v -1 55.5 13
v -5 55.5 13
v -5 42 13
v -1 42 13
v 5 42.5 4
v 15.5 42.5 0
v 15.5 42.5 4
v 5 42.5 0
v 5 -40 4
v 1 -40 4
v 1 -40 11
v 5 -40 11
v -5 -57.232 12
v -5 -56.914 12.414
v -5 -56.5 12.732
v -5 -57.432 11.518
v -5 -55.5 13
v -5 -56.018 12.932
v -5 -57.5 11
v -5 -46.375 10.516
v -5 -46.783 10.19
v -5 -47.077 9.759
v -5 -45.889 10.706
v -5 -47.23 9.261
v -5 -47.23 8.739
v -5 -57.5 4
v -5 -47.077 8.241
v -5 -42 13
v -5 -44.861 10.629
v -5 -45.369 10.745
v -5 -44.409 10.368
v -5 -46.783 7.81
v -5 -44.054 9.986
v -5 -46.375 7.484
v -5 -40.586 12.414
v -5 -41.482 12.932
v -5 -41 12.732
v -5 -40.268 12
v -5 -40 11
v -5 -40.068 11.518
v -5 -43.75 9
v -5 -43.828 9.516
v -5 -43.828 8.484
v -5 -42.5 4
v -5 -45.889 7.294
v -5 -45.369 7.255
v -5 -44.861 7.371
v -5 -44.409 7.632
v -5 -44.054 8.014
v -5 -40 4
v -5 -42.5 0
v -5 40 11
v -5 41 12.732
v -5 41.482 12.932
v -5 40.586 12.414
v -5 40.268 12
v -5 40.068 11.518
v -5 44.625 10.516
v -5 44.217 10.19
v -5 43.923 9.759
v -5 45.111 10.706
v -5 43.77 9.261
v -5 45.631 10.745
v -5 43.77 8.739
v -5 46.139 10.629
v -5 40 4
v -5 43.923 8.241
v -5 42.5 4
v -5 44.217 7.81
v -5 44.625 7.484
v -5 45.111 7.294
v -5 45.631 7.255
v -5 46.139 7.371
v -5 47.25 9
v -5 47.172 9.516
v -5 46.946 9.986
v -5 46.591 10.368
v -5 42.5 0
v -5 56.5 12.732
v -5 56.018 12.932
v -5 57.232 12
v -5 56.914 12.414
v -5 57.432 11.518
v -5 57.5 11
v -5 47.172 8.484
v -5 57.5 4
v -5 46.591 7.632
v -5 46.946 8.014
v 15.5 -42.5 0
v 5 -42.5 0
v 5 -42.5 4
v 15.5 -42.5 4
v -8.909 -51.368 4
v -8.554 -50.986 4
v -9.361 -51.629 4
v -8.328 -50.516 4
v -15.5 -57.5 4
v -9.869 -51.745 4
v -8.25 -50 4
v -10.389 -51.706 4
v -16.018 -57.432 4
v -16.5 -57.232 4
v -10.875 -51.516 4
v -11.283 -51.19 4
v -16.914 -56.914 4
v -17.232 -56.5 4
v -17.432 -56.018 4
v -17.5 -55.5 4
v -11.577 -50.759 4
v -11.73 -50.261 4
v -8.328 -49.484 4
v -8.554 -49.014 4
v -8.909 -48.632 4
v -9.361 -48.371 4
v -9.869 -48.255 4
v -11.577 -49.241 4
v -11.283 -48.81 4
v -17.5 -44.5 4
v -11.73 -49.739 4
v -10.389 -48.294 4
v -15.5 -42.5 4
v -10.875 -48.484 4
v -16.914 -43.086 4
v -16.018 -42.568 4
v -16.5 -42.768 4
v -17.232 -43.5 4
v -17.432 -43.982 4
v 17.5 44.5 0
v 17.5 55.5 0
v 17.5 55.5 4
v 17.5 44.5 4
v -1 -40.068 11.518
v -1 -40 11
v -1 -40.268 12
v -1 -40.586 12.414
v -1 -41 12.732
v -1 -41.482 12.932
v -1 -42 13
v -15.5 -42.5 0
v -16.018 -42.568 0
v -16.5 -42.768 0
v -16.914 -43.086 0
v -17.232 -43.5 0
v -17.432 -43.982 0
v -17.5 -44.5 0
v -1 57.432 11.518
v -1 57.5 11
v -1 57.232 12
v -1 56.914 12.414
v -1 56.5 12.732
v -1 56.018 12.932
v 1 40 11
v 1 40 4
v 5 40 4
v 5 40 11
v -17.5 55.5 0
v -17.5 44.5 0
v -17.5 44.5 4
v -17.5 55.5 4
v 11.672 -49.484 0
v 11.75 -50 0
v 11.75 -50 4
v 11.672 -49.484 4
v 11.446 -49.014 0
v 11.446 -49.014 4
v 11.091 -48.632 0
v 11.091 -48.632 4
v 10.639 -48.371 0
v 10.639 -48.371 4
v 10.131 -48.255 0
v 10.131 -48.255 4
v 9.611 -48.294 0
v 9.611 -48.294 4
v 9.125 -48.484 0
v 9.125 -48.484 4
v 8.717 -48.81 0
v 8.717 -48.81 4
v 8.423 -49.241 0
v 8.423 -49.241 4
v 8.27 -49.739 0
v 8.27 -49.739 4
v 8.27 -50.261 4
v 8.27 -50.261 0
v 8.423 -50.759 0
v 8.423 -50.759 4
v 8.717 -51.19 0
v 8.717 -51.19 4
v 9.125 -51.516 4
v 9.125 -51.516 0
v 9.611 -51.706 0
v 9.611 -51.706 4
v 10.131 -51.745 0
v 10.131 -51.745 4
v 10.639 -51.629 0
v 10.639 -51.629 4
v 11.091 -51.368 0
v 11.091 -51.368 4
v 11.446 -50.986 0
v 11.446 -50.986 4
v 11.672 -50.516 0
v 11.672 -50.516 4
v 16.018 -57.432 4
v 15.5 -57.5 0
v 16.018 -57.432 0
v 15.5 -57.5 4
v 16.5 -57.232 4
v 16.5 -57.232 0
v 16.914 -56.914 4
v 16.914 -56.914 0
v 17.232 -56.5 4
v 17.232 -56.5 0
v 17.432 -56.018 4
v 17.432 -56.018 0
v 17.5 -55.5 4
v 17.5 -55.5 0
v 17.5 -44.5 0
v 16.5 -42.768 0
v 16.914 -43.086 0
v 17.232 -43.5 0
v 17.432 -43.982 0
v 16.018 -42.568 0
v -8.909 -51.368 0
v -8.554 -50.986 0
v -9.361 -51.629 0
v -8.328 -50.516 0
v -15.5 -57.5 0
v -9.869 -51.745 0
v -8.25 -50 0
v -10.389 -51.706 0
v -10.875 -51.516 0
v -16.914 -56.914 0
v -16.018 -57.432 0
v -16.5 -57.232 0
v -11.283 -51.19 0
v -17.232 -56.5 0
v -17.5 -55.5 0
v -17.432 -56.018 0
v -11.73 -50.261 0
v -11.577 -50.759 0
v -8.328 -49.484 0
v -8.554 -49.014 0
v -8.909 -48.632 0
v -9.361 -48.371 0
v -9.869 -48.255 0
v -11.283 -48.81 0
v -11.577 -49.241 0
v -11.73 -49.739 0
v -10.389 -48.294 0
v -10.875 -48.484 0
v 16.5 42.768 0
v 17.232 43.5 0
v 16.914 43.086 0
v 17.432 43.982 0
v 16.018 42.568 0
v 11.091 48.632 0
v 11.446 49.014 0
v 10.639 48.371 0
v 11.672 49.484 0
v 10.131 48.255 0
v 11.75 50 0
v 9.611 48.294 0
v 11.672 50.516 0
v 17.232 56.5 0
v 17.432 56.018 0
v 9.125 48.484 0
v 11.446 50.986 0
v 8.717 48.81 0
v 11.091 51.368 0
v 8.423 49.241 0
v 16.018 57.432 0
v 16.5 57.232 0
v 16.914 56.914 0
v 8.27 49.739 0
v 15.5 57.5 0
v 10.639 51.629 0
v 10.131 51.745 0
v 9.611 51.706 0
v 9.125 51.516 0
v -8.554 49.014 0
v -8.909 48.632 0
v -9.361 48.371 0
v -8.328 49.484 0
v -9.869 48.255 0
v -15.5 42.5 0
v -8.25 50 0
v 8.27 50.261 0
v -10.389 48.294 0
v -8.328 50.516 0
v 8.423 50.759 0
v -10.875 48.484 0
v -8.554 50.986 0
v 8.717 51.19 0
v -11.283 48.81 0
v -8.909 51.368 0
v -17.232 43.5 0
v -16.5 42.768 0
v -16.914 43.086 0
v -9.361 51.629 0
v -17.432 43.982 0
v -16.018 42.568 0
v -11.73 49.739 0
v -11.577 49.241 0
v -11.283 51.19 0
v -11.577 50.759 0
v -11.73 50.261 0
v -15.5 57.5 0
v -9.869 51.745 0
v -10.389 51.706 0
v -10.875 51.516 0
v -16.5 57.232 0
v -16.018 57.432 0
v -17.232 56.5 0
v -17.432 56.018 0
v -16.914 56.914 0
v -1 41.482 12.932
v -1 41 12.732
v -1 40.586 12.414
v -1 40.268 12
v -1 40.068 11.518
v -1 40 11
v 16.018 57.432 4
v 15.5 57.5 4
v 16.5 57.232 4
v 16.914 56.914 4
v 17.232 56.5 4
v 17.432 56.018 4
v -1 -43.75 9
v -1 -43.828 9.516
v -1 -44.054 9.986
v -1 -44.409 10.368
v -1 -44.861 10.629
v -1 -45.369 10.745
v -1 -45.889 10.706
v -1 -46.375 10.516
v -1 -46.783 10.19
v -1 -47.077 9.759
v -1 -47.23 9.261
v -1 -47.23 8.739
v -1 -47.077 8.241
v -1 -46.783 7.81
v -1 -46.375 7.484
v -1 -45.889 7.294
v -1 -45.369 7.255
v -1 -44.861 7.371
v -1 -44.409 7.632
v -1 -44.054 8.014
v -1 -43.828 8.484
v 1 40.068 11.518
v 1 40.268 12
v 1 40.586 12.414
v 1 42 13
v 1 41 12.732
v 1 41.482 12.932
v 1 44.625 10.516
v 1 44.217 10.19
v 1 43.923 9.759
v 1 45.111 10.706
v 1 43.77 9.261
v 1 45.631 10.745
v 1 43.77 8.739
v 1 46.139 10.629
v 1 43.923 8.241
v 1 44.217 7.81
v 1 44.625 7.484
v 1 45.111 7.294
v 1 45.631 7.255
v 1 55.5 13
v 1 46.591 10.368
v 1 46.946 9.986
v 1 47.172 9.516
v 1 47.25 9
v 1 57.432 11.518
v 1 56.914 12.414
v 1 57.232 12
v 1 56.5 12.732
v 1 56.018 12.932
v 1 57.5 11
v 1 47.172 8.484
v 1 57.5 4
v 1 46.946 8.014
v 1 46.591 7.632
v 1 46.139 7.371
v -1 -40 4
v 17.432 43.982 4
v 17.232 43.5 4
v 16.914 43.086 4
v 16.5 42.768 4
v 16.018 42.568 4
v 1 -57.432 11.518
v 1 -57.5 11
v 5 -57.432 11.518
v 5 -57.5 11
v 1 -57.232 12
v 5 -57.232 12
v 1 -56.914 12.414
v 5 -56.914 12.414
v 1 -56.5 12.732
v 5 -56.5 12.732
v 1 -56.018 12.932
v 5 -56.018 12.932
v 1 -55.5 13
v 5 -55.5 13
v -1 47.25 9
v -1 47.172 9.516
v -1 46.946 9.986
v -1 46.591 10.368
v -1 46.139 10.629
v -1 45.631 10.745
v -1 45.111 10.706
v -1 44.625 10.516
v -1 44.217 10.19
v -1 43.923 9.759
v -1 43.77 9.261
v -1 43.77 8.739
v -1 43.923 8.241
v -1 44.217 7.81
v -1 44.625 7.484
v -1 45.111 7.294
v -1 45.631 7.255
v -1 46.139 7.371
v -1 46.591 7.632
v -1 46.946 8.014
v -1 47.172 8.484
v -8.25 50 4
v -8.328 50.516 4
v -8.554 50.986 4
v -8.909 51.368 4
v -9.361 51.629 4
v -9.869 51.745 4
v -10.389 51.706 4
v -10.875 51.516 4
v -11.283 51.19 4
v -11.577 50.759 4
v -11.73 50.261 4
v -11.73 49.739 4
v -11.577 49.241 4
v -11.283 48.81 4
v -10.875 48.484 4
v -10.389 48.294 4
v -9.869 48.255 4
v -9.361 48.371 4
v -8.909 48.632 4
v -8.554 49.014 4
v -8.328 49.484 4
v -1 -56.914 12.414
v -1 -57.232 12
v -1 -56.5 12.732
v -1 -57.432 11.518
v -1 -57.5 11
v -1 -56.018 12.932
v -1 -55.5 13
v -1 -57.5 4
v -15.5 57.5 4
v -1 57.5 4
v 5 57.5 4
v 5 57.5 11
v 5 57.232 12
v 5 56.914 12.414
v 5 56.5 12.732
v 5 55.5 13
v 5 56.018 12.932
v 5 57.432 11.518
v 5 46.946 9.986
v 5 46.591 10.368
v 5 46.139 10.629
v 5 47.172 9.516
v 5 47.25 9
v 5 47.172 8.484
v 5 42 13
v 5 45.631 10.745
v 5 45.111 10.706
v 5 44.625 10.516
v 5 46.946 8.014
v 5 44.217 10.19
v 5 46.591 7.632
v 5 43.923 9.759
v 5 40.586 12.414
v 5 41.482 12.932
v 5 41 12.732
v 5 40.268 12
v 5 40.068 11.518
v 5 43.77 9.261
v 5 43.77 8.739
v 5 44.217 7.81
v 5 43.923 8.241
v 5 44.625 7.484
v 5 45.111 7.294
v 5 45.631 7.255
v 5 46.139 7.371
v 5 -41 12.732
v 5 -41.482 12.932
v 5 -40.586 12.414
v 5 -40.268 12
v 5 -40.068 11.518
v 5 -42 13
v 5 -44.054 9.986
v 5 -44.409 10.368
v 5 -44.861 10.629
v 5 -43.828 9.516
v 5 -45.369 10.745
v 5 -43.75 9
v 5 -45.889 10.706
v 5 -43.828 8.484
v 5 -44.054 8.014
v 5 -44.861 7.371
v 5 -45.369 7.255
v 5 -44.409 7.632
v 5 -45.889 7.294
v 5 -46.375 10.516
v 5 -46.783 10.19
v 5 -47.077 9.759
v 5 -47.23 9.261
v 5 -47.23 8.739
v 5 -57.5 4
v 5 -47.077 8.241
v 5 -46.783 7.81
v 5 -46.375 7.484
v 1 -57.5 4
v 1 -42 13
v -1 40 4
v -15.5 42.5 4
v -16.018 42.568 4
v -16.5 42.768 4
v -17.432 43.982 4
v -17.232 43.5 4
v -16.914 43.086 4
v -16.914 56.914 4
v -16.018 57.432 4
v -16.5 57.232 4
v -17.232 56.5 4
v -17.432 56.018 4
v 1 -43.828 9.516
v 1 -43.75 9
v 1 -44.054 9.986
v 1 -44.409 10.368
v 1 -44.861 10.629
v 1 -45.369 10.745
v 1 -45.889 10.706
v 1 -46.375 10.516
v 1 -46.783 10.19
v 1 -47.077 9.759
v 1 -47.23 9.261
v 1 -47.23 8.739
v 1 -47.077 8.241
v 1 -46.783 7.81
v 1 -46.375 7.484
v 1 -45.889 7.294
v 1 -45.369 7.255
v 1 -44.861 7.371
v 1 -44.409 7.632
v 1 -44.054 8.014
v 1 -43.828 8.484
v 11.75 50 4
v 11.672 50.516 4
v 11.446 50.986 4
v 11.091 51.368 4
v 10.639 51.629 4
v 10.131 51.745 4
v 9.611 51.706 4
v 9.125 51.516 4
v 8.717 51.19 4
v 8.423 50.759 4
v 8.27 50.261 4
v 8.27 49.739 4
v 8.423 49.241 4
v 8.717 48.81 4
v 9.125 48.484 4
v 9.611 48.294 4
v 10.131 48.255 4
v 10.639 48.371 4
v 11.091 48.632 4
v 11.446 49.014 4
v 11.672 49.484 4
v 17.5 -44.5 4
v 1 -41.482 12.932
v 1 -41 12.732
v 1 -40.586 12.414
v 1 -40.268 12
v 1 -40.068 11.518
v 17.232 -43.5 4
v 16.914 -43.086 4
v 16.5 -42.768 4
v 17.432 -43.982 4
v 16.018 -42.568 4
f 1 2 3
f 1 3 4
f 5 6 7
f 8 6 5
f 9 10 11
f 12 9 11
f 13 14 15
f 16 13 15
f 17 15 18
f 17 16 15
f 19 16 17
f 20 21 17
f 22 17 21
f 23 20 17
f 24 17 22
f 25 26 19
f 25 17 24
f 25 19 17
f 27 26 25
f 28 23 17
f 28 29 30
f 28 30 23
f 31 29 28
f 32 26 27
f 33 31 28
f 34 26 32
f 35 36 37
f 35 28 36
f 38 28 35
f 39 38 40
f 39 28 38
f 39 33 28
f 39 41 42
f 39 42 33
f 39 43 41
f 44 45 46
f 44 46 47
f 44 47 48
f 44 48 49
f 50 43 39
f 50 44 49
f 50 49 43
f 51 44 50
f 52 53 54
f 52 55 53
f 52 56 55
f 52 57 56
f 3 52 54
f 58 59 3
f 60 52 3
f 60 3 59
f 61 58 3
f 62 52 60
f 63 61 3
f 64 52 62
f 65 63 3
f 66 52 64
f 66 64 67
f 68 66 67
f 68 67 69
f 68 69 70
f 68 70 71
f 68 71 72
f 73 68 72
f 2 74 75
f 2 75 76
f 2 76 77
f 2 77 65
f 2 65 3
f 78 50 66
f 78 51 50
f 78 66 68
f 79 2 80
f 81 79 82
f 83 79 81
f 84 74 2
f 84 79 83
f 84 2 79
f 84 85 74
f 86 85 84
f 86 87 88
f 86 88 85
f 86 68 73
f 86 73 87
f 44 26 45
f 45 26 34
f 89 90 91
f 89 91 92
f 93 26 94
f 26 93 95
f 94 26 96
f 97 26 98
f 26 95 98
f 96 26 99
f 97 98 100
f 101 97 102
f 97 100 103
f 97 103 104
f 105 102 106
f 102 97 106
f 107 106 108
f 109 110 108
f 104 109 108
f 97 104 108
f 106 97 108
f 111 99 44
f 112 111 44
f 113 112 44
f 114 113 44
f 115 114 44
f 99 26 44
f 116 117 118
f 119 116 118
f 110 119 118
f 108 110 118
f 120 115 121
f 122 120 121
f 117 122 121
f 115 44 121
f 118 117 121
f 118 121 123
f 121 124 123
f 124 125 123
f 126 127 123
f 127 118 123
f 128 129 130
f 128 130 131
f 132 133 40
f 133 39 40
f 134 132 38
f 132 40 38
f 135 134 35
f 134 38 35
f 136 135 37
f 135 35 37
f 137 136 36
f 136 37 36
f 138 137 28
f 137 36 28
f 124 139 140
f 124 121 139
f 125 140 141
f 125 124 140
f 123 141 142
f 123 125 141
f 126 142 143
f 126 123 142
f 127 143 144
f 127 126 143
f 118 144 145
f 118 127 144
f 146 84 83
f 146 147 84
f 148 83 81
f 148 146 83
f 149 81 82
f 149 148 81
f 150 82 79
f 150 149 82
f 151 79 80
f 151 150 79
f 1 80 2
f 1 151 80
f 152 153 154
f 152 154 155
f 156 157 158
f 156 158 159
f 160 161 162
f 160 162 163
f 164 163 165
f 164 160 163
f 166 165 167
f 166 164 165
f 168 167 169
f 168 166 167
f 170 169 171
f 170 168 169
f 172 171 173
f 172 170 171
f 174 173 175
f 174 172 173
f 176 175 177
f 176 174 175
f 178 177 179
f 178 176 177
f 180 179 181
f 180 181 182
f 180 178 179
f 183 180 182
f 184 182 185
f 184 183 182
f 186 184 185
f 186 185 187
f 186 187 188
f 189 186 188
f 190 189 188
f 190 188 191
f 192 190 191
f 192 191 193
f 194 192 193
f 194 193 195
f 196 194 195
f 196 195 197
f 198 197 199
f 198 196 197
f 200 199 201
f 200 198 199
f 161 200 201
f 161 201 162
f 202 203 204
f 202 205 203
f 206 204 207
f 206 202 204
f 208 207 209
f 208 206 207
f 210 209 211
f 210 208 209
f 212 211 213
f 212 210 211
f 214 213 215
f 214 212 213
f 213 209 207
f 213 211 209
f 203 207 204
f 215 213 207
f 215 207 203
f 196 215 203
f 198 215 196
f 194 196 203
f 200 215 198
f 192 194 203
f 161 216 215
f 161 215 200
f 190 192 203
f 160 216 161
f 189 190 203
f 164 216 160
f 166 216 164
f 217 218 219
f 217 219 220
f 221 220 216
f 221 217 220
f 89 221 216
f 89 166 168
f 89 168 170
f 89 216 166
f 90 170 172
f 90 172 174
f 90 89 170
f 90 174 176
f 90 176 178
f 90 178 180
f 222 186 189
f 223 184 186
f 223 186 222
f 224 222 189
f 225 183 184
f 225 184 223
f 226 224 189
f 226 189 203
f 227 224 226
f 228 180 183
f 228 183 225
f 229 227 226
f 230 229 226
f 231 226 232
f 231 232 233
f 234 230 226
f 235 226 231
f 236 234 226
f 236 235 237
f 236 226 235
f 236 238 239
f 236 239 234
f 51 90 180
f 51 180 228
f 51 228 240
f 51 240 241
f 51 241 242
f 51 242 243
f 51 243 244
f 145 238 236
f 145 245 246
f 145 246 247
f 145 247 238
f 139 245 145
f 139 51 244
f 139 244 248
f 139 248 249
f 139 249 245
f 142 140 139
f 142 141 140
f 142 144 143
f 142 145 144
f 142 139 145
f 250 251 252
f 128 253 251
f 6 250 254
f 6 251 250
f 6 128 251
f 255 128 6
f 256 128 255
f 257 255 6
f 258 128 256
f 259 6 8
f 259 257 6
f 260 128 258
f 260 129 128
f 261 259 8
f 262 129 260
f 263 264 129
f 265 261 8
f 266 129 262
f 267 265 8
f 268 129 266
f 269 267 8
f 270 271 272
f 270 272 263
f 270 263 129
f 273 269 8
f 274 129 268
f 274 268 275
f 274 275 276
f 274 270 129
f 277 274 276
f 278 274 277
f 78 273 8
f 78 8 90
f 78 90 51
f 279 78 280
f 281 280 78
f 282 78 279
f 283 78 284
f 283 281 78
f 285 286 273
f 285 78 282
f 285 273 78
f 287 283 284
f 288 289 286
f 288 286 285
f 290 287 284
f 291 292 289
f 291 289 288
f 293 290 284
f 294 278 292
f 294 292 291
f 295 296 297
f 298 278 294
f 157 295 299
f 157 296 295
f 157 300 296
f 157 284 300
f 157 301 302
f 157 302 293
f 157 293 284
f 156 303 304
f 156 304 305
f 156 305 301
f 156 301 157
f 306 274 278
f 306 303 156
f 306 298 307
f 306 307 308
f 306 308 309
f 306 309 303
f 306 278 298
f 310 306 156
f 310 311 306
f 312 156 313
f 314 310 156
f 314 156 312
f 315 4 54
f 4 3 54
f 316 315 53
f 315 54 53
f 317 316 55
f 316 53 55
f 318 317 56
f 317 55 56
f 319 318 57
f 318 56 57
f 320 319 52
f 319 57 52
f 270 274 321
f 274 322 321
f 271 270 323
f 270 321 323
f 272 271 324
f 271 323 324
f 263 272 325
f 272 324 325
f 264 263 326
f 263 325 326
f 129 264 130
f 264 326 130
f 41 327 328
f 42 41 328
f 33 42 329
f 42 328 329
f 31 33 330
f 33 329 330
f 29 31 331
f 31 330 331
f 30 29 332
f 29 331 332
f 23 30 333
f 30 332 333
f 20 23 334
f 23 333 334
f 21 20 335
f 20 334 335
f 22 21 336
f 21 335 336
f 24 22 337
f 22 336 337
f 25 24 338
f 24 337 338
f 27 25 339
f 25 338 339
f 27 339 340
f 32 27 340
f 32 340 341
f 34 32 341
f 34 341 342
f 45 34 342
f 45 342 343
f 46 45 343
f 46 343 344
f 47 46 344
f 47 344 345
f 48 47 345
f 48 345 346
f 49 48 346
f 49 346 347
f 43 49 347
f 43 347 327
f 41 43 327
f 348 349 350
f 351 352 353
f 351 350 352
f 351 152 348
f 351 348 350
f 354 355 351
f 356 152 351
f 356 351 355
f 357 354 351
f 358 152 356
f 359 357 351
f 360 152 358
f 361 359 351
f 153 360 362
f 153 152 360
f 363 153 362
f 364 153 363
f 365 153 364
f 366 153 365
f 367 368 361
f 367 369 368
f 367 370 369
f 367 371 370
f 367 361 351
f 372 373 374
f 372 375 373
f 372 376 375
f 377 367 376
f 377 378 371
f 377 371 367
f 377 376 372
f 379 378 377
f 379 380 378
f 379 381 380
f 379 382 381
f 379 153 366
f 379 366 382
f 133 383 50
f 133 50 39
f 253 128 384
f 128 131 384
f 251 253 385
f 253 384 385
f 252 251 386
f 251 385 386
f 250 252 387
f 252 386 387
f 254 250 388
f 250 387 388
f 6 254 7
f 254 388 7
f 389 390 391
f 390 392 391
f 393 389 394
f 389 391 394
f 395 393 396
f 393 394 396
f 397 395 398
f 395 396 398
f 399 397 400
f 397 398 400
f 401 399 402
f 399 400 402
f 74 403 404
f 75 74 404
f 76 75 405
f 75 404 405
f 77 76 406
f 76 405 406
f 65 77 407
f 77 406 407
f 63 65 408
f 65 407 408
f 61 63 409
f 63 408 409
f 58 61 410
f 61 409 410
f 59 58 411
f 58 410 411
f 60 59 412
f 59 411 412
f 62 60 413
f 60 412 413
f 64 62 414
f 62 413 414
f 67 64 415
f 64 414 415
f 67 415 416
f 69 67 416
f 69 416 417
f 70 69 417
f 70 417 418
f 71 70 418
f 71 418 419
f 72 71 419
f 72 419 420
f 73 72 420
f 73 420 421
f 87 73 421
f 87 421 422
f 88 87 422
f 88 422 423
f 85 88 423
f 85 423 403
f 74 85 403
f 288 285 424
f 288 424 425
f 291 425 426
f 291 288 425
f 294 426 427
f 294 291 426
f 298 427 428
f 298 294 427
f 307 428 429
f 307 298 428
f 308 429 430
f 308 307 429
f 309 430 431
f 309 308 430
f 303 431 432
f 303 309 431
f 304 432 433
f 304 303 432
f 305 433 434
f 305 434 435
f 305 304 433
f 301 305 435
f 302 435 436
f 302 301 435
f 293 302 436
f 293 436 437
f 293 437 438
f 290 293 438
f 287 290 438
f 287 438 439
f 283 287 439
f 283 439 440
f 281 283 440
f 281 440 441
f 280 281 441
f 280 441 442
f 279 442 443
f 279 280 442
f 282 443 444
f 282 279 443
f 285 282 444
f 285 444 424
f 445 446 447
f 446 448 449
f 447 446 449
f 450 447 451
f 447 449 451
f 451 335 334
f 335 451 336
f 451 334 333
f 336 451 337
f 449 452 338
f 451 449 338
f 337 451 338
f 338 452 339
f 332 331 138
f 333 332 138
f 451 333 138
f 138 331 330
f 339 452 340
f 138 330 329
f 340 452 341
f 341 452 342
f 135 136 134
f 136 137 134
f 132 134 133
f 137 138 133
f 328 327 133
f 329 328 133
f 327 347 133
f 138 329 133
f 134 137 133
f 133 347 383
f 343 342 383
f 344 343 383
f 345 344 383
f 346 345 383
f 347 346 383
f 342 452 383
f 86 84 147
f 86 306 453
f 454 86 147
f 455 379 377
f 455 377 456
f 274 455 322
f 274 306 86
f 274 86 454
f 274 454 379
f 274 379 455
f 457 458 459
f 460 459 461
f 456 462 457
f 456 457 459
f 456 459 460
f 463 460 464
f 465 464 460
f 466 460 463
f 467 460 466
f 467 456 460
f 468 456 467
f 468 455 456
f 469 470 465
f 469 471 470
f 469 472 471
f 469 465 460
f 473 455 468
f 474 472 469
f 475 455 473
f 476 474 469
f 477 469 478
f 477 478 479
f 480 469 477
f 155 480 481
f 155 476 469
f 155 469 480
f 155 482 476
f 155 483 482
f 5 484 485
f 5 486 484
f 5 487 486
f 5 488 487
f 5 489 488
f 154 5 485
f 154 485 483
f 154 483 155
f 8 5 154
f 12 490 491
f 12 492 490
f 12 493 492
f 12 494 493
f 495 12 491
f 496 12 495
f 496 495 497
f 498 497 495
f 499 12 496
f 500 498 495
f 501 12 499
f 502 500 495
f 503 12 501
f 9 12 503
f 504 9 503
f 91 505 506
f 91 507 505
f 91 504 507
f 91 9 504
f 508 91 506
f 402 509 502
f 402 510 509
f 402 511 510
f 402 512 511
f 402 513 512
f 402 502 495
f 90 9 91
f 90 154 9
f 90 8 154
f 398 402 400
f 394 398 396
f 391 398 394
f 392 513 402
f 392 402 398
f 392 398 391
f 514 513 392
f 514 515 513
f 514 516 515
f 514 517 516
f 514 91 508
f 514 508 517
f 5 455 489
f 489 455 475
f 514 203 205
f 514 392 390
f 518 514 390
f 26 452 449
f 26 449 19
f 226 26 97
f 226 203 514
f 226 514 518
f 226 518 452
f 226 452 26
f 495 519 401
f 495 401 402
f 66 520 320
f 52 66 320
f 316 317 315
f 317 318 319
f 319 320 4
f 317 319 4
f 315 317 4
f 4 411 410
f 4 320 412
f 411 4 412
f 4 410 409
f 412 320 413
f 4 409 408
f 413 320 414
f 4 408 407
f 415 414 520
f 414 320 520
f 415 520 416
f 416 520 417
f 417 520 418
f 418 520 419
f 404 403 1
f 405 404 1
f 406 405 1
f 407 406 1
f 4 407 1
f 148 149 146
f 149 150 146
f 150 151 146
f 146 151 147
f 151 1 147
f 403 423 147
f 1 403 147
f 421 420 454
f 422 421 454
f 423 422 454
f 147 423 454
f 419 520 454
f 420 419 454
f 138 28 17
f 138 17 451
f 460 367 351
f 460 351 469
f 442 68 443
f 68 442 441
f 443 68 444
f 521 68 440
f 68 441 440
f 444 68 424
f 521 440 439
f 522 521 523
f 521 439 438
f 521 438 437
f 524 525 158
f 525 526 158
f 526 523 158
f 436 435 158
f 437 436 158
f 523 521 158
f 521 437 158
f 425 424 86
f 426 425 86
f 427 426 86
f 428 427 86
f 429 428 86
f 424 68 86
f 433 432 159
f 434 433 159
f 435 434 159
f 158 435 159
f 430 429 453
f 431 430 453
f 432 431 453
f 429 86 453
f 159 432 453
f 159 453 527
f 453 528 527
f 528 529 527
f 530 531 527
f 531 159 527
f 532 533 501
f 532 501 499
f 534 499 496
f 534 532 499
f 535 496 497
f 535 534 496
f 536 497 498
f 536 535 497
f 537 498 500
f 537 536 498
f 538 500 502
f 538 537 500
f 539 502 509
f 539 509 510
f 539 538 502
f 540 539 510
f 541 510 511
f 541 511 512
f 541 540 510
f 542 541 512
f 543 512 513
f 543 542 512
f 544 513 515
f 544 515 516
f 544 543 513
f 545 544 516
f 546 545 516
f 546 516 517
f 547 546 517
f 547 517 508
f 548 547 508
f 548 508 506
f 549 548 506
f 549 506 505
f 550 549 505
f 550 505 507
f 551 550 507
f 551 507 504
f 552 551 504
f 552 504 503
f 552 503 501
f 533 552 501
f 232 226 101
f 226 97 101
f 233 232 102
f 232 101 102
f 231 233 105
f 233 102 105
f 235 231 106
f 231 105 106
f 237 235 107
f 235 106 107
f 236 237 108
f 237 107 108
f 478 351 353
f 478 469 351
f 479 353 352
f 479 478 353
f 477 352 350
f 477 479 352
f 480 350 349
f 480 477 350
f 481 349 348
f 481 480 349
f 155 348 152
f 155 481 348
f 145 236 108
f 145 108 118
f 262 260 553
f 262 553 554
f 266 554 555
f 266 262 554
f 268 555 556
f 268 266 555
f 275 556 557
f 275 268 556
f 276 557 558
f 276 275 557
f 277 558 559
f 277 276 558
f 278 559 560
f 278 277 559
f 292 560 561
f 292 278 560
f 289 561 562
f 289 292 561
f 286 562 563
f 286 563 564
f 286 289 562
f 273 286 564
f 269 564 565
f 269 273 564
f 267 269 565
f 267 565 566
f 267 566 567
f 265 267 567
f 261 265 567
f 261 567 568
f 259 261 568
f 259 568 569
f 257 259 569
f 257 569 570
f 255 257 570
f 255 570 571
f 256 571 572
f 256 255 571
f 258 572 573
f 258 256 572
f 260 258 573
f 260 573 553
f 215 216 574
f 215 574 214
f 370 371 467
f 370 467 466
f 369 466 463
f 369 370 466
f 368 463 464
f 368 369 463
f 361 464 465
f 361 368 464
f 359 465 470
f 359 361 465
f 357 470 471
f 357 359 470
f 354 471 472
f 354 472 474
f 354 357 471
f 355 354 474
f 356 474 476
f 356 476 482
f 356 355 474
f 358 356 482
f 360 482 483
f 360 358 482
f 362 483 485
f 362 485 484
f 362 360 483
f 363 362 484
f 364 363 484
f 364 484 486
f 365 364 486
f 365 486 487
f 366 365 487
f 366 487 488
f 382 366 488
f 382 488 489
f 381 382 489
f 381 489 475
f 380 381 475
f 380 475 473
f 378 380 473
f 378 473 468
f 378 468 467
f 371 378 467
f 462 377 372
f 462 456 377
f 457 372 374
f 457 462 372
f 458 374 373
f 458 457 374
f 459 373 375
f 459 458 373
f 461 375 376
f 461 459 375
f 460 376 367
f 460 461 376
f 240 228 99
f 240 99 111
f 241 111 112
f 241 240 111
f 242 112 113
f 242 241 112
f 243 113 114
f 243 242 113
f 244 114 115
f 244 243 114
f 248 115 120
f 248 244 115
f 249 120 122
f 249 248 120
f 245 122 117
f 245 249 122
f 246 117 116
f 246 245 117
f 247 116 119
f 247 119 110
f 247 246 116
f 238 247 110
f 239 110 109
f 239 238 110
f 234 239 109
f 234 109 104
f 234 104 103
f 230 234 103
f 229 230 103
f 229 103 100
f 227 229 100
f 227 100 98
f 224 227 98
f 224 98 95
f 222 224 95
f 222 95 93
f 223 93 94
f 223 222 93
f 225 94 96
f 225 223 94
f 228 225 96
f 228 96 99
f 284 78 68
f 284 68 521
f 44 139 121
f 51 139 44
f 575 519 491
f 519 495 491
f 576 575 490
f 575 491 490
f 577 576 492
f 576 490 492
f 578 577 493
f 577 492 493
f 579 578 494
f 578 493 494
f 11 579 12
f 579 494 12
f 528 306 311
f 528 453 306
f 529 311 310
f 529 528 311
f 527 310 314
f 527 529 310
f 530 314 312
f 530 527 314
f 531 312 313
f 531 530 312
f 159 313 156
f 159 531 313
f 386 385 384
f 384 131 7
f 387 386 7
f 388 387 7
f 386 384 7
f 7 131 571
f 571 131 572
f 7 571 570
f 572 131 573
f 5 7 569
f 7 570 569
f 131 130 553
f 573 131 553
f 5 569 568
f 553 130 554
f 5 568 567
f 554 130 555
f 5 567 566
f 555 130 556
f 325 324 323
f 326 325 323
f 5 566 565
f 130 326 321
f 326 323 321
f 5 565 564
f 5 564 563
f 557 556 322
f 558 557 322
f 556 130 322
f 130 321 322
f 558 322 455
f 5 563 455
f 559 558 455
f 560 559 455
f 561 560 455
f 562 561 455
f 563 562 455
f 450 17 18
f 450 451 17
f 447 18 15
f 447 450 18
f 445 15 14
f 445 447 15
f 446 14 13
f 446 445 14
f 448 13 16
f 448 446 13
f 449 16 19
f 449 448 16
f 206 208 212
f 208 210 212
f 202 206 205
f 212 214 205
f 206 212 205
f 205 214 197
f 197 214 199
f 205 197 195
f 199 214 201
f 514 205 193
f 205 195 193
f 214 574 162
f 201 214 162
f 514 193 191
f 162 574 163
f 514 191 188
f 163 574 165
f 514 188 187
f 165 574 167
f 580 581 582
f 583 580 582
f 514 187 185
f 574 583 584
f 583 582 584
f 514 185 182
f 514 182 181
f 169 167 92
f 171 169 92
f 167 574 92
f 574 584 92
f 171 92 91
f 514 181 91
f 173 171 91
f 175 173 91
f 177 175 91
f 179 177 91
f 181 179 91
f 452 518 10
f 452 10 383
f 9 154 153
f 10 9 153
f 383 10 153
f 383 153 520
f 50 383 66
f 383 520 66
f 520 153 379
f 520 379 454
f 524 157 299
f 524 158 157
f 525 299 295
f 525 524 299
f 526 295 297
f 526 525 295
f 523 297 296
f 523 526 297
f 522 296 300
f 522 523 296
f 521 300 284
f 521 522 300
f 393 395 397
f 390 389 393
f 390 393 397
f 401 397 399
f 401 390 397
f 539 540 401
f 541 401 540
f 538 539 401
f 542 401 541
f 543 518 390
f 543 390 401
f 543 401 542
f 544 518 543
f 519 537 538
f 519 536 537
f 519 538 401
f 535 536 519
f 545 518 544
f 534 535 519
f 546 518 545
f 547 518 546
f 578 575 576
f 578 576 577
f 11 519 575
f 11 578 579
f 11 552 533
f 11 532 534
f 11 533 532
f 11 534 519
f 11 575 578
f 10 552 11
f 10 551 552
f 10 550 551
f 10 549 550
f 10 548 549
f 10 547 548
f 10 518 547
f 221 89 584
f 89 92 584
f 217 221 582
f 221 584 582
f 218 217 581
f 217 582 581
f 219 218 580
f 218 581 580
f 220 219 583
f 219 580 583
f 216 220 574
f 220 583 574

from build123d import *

# Parameters (mm, degrees)
SKETCH_R          = 1.75
PAD_DEPTH         = 4
SKETCH001_W       = 4
SKETCH001_H       = 115
PAD001_DEPTH      = 13
SKETCH002_R       = 1.75
SKETCH002_W       = 80
SKETCH002_H       = 9
POCKET_DEPTH      = 10
POCKET_DEPTH_BACK = -5
FILLET_R          = 2


with BuildPart() as part:
    # Sketch → Pad (new body)
    with BuildSketch(Plane.XY):
        Polygon((-17.5, 57.5), (17.5, 57.5), (17.5, 42.5), (5, 42.5), (5, -42.5), (17.5, -42.5), (17.5, -57.5), (-17.5, -57.5), (-17.5, -42.5), (-5, -42.5), (-5, 42.5), (-17.5, 42.5), align=None)
        with Locations((-10, 50)):
            Circle(SKETCH_R, mode=Mode.SUBTRACT)
        with Locations((10, 50)):
            Circle(SKETCH_R, mode=Mode.SUBTRACT)
        with Locations((-10, -50)):
            Circle(SKETCH_R, mode=Mode.SUBTRACT)
        with Locations((10, -50)):
            Circle(SKETCH_R, mode=Mode.SUBTRACT)
    extrude(amount=PAD_DEPTH)

    # Sketch001 → Pad001 (join)
    with BuildSketch(Plane.XY):
        with Locations((-3, 0)):
            Rectangle(SKETCH001_W, SKETCH001_H)
        with Locations((3, 0)):
            Rectangle(SKETCH001_W, SKETCH001_H)
    extrude(amount=PAD001_DEPTH)

    # Sketch002 → Pocket (cut, two sides)
    with BuildSketch(Plane.YZ) as pocket_sk:
        with Locations((45.5, 9)):
            Circle(SKETCH002_R)
        with Locations((-45.5, 9)):
            Circle(SKETCH002_R)
        with Locations((0, 8.5)):
            Rectangle(SKETCH002_W, SKETCH002_H)
    extrude(amount=-POCKET_DEPTH, mode=Mode.SUBTRACT)
    extrude(pocket_sk.sketch, amount=-POCKET_DEPTH_BACK, mode=Mode.SUBTRACT)

    # Fillet
    fillet_edges = [part.edges().sort_by_distance(p)[0] for p in [
        (-3, -40, 13),
        (3, -40, 13),
        (-3, 40, 13),
        (3, 40, 13),
        (-3, 57.5, 13),
        (3, 57.5, 13),
        (17.5, 57.5, 2),
        (17.5, 42.5, 2),
        (3, -57.5, 13),
        (-3, -57.5, 13),
        (17.5, -42.5, 2),
        (17.5, -57.5, 2),
        (-17.5, -42.5, 2),
        (-17.5, -57.5, 2),
        (-17.5, 42.5, 2),
        (-17.5, 57.5, 2),
    ]]
    fillet(fillet_edges, radius=FILLET_R)


solid = part.part
